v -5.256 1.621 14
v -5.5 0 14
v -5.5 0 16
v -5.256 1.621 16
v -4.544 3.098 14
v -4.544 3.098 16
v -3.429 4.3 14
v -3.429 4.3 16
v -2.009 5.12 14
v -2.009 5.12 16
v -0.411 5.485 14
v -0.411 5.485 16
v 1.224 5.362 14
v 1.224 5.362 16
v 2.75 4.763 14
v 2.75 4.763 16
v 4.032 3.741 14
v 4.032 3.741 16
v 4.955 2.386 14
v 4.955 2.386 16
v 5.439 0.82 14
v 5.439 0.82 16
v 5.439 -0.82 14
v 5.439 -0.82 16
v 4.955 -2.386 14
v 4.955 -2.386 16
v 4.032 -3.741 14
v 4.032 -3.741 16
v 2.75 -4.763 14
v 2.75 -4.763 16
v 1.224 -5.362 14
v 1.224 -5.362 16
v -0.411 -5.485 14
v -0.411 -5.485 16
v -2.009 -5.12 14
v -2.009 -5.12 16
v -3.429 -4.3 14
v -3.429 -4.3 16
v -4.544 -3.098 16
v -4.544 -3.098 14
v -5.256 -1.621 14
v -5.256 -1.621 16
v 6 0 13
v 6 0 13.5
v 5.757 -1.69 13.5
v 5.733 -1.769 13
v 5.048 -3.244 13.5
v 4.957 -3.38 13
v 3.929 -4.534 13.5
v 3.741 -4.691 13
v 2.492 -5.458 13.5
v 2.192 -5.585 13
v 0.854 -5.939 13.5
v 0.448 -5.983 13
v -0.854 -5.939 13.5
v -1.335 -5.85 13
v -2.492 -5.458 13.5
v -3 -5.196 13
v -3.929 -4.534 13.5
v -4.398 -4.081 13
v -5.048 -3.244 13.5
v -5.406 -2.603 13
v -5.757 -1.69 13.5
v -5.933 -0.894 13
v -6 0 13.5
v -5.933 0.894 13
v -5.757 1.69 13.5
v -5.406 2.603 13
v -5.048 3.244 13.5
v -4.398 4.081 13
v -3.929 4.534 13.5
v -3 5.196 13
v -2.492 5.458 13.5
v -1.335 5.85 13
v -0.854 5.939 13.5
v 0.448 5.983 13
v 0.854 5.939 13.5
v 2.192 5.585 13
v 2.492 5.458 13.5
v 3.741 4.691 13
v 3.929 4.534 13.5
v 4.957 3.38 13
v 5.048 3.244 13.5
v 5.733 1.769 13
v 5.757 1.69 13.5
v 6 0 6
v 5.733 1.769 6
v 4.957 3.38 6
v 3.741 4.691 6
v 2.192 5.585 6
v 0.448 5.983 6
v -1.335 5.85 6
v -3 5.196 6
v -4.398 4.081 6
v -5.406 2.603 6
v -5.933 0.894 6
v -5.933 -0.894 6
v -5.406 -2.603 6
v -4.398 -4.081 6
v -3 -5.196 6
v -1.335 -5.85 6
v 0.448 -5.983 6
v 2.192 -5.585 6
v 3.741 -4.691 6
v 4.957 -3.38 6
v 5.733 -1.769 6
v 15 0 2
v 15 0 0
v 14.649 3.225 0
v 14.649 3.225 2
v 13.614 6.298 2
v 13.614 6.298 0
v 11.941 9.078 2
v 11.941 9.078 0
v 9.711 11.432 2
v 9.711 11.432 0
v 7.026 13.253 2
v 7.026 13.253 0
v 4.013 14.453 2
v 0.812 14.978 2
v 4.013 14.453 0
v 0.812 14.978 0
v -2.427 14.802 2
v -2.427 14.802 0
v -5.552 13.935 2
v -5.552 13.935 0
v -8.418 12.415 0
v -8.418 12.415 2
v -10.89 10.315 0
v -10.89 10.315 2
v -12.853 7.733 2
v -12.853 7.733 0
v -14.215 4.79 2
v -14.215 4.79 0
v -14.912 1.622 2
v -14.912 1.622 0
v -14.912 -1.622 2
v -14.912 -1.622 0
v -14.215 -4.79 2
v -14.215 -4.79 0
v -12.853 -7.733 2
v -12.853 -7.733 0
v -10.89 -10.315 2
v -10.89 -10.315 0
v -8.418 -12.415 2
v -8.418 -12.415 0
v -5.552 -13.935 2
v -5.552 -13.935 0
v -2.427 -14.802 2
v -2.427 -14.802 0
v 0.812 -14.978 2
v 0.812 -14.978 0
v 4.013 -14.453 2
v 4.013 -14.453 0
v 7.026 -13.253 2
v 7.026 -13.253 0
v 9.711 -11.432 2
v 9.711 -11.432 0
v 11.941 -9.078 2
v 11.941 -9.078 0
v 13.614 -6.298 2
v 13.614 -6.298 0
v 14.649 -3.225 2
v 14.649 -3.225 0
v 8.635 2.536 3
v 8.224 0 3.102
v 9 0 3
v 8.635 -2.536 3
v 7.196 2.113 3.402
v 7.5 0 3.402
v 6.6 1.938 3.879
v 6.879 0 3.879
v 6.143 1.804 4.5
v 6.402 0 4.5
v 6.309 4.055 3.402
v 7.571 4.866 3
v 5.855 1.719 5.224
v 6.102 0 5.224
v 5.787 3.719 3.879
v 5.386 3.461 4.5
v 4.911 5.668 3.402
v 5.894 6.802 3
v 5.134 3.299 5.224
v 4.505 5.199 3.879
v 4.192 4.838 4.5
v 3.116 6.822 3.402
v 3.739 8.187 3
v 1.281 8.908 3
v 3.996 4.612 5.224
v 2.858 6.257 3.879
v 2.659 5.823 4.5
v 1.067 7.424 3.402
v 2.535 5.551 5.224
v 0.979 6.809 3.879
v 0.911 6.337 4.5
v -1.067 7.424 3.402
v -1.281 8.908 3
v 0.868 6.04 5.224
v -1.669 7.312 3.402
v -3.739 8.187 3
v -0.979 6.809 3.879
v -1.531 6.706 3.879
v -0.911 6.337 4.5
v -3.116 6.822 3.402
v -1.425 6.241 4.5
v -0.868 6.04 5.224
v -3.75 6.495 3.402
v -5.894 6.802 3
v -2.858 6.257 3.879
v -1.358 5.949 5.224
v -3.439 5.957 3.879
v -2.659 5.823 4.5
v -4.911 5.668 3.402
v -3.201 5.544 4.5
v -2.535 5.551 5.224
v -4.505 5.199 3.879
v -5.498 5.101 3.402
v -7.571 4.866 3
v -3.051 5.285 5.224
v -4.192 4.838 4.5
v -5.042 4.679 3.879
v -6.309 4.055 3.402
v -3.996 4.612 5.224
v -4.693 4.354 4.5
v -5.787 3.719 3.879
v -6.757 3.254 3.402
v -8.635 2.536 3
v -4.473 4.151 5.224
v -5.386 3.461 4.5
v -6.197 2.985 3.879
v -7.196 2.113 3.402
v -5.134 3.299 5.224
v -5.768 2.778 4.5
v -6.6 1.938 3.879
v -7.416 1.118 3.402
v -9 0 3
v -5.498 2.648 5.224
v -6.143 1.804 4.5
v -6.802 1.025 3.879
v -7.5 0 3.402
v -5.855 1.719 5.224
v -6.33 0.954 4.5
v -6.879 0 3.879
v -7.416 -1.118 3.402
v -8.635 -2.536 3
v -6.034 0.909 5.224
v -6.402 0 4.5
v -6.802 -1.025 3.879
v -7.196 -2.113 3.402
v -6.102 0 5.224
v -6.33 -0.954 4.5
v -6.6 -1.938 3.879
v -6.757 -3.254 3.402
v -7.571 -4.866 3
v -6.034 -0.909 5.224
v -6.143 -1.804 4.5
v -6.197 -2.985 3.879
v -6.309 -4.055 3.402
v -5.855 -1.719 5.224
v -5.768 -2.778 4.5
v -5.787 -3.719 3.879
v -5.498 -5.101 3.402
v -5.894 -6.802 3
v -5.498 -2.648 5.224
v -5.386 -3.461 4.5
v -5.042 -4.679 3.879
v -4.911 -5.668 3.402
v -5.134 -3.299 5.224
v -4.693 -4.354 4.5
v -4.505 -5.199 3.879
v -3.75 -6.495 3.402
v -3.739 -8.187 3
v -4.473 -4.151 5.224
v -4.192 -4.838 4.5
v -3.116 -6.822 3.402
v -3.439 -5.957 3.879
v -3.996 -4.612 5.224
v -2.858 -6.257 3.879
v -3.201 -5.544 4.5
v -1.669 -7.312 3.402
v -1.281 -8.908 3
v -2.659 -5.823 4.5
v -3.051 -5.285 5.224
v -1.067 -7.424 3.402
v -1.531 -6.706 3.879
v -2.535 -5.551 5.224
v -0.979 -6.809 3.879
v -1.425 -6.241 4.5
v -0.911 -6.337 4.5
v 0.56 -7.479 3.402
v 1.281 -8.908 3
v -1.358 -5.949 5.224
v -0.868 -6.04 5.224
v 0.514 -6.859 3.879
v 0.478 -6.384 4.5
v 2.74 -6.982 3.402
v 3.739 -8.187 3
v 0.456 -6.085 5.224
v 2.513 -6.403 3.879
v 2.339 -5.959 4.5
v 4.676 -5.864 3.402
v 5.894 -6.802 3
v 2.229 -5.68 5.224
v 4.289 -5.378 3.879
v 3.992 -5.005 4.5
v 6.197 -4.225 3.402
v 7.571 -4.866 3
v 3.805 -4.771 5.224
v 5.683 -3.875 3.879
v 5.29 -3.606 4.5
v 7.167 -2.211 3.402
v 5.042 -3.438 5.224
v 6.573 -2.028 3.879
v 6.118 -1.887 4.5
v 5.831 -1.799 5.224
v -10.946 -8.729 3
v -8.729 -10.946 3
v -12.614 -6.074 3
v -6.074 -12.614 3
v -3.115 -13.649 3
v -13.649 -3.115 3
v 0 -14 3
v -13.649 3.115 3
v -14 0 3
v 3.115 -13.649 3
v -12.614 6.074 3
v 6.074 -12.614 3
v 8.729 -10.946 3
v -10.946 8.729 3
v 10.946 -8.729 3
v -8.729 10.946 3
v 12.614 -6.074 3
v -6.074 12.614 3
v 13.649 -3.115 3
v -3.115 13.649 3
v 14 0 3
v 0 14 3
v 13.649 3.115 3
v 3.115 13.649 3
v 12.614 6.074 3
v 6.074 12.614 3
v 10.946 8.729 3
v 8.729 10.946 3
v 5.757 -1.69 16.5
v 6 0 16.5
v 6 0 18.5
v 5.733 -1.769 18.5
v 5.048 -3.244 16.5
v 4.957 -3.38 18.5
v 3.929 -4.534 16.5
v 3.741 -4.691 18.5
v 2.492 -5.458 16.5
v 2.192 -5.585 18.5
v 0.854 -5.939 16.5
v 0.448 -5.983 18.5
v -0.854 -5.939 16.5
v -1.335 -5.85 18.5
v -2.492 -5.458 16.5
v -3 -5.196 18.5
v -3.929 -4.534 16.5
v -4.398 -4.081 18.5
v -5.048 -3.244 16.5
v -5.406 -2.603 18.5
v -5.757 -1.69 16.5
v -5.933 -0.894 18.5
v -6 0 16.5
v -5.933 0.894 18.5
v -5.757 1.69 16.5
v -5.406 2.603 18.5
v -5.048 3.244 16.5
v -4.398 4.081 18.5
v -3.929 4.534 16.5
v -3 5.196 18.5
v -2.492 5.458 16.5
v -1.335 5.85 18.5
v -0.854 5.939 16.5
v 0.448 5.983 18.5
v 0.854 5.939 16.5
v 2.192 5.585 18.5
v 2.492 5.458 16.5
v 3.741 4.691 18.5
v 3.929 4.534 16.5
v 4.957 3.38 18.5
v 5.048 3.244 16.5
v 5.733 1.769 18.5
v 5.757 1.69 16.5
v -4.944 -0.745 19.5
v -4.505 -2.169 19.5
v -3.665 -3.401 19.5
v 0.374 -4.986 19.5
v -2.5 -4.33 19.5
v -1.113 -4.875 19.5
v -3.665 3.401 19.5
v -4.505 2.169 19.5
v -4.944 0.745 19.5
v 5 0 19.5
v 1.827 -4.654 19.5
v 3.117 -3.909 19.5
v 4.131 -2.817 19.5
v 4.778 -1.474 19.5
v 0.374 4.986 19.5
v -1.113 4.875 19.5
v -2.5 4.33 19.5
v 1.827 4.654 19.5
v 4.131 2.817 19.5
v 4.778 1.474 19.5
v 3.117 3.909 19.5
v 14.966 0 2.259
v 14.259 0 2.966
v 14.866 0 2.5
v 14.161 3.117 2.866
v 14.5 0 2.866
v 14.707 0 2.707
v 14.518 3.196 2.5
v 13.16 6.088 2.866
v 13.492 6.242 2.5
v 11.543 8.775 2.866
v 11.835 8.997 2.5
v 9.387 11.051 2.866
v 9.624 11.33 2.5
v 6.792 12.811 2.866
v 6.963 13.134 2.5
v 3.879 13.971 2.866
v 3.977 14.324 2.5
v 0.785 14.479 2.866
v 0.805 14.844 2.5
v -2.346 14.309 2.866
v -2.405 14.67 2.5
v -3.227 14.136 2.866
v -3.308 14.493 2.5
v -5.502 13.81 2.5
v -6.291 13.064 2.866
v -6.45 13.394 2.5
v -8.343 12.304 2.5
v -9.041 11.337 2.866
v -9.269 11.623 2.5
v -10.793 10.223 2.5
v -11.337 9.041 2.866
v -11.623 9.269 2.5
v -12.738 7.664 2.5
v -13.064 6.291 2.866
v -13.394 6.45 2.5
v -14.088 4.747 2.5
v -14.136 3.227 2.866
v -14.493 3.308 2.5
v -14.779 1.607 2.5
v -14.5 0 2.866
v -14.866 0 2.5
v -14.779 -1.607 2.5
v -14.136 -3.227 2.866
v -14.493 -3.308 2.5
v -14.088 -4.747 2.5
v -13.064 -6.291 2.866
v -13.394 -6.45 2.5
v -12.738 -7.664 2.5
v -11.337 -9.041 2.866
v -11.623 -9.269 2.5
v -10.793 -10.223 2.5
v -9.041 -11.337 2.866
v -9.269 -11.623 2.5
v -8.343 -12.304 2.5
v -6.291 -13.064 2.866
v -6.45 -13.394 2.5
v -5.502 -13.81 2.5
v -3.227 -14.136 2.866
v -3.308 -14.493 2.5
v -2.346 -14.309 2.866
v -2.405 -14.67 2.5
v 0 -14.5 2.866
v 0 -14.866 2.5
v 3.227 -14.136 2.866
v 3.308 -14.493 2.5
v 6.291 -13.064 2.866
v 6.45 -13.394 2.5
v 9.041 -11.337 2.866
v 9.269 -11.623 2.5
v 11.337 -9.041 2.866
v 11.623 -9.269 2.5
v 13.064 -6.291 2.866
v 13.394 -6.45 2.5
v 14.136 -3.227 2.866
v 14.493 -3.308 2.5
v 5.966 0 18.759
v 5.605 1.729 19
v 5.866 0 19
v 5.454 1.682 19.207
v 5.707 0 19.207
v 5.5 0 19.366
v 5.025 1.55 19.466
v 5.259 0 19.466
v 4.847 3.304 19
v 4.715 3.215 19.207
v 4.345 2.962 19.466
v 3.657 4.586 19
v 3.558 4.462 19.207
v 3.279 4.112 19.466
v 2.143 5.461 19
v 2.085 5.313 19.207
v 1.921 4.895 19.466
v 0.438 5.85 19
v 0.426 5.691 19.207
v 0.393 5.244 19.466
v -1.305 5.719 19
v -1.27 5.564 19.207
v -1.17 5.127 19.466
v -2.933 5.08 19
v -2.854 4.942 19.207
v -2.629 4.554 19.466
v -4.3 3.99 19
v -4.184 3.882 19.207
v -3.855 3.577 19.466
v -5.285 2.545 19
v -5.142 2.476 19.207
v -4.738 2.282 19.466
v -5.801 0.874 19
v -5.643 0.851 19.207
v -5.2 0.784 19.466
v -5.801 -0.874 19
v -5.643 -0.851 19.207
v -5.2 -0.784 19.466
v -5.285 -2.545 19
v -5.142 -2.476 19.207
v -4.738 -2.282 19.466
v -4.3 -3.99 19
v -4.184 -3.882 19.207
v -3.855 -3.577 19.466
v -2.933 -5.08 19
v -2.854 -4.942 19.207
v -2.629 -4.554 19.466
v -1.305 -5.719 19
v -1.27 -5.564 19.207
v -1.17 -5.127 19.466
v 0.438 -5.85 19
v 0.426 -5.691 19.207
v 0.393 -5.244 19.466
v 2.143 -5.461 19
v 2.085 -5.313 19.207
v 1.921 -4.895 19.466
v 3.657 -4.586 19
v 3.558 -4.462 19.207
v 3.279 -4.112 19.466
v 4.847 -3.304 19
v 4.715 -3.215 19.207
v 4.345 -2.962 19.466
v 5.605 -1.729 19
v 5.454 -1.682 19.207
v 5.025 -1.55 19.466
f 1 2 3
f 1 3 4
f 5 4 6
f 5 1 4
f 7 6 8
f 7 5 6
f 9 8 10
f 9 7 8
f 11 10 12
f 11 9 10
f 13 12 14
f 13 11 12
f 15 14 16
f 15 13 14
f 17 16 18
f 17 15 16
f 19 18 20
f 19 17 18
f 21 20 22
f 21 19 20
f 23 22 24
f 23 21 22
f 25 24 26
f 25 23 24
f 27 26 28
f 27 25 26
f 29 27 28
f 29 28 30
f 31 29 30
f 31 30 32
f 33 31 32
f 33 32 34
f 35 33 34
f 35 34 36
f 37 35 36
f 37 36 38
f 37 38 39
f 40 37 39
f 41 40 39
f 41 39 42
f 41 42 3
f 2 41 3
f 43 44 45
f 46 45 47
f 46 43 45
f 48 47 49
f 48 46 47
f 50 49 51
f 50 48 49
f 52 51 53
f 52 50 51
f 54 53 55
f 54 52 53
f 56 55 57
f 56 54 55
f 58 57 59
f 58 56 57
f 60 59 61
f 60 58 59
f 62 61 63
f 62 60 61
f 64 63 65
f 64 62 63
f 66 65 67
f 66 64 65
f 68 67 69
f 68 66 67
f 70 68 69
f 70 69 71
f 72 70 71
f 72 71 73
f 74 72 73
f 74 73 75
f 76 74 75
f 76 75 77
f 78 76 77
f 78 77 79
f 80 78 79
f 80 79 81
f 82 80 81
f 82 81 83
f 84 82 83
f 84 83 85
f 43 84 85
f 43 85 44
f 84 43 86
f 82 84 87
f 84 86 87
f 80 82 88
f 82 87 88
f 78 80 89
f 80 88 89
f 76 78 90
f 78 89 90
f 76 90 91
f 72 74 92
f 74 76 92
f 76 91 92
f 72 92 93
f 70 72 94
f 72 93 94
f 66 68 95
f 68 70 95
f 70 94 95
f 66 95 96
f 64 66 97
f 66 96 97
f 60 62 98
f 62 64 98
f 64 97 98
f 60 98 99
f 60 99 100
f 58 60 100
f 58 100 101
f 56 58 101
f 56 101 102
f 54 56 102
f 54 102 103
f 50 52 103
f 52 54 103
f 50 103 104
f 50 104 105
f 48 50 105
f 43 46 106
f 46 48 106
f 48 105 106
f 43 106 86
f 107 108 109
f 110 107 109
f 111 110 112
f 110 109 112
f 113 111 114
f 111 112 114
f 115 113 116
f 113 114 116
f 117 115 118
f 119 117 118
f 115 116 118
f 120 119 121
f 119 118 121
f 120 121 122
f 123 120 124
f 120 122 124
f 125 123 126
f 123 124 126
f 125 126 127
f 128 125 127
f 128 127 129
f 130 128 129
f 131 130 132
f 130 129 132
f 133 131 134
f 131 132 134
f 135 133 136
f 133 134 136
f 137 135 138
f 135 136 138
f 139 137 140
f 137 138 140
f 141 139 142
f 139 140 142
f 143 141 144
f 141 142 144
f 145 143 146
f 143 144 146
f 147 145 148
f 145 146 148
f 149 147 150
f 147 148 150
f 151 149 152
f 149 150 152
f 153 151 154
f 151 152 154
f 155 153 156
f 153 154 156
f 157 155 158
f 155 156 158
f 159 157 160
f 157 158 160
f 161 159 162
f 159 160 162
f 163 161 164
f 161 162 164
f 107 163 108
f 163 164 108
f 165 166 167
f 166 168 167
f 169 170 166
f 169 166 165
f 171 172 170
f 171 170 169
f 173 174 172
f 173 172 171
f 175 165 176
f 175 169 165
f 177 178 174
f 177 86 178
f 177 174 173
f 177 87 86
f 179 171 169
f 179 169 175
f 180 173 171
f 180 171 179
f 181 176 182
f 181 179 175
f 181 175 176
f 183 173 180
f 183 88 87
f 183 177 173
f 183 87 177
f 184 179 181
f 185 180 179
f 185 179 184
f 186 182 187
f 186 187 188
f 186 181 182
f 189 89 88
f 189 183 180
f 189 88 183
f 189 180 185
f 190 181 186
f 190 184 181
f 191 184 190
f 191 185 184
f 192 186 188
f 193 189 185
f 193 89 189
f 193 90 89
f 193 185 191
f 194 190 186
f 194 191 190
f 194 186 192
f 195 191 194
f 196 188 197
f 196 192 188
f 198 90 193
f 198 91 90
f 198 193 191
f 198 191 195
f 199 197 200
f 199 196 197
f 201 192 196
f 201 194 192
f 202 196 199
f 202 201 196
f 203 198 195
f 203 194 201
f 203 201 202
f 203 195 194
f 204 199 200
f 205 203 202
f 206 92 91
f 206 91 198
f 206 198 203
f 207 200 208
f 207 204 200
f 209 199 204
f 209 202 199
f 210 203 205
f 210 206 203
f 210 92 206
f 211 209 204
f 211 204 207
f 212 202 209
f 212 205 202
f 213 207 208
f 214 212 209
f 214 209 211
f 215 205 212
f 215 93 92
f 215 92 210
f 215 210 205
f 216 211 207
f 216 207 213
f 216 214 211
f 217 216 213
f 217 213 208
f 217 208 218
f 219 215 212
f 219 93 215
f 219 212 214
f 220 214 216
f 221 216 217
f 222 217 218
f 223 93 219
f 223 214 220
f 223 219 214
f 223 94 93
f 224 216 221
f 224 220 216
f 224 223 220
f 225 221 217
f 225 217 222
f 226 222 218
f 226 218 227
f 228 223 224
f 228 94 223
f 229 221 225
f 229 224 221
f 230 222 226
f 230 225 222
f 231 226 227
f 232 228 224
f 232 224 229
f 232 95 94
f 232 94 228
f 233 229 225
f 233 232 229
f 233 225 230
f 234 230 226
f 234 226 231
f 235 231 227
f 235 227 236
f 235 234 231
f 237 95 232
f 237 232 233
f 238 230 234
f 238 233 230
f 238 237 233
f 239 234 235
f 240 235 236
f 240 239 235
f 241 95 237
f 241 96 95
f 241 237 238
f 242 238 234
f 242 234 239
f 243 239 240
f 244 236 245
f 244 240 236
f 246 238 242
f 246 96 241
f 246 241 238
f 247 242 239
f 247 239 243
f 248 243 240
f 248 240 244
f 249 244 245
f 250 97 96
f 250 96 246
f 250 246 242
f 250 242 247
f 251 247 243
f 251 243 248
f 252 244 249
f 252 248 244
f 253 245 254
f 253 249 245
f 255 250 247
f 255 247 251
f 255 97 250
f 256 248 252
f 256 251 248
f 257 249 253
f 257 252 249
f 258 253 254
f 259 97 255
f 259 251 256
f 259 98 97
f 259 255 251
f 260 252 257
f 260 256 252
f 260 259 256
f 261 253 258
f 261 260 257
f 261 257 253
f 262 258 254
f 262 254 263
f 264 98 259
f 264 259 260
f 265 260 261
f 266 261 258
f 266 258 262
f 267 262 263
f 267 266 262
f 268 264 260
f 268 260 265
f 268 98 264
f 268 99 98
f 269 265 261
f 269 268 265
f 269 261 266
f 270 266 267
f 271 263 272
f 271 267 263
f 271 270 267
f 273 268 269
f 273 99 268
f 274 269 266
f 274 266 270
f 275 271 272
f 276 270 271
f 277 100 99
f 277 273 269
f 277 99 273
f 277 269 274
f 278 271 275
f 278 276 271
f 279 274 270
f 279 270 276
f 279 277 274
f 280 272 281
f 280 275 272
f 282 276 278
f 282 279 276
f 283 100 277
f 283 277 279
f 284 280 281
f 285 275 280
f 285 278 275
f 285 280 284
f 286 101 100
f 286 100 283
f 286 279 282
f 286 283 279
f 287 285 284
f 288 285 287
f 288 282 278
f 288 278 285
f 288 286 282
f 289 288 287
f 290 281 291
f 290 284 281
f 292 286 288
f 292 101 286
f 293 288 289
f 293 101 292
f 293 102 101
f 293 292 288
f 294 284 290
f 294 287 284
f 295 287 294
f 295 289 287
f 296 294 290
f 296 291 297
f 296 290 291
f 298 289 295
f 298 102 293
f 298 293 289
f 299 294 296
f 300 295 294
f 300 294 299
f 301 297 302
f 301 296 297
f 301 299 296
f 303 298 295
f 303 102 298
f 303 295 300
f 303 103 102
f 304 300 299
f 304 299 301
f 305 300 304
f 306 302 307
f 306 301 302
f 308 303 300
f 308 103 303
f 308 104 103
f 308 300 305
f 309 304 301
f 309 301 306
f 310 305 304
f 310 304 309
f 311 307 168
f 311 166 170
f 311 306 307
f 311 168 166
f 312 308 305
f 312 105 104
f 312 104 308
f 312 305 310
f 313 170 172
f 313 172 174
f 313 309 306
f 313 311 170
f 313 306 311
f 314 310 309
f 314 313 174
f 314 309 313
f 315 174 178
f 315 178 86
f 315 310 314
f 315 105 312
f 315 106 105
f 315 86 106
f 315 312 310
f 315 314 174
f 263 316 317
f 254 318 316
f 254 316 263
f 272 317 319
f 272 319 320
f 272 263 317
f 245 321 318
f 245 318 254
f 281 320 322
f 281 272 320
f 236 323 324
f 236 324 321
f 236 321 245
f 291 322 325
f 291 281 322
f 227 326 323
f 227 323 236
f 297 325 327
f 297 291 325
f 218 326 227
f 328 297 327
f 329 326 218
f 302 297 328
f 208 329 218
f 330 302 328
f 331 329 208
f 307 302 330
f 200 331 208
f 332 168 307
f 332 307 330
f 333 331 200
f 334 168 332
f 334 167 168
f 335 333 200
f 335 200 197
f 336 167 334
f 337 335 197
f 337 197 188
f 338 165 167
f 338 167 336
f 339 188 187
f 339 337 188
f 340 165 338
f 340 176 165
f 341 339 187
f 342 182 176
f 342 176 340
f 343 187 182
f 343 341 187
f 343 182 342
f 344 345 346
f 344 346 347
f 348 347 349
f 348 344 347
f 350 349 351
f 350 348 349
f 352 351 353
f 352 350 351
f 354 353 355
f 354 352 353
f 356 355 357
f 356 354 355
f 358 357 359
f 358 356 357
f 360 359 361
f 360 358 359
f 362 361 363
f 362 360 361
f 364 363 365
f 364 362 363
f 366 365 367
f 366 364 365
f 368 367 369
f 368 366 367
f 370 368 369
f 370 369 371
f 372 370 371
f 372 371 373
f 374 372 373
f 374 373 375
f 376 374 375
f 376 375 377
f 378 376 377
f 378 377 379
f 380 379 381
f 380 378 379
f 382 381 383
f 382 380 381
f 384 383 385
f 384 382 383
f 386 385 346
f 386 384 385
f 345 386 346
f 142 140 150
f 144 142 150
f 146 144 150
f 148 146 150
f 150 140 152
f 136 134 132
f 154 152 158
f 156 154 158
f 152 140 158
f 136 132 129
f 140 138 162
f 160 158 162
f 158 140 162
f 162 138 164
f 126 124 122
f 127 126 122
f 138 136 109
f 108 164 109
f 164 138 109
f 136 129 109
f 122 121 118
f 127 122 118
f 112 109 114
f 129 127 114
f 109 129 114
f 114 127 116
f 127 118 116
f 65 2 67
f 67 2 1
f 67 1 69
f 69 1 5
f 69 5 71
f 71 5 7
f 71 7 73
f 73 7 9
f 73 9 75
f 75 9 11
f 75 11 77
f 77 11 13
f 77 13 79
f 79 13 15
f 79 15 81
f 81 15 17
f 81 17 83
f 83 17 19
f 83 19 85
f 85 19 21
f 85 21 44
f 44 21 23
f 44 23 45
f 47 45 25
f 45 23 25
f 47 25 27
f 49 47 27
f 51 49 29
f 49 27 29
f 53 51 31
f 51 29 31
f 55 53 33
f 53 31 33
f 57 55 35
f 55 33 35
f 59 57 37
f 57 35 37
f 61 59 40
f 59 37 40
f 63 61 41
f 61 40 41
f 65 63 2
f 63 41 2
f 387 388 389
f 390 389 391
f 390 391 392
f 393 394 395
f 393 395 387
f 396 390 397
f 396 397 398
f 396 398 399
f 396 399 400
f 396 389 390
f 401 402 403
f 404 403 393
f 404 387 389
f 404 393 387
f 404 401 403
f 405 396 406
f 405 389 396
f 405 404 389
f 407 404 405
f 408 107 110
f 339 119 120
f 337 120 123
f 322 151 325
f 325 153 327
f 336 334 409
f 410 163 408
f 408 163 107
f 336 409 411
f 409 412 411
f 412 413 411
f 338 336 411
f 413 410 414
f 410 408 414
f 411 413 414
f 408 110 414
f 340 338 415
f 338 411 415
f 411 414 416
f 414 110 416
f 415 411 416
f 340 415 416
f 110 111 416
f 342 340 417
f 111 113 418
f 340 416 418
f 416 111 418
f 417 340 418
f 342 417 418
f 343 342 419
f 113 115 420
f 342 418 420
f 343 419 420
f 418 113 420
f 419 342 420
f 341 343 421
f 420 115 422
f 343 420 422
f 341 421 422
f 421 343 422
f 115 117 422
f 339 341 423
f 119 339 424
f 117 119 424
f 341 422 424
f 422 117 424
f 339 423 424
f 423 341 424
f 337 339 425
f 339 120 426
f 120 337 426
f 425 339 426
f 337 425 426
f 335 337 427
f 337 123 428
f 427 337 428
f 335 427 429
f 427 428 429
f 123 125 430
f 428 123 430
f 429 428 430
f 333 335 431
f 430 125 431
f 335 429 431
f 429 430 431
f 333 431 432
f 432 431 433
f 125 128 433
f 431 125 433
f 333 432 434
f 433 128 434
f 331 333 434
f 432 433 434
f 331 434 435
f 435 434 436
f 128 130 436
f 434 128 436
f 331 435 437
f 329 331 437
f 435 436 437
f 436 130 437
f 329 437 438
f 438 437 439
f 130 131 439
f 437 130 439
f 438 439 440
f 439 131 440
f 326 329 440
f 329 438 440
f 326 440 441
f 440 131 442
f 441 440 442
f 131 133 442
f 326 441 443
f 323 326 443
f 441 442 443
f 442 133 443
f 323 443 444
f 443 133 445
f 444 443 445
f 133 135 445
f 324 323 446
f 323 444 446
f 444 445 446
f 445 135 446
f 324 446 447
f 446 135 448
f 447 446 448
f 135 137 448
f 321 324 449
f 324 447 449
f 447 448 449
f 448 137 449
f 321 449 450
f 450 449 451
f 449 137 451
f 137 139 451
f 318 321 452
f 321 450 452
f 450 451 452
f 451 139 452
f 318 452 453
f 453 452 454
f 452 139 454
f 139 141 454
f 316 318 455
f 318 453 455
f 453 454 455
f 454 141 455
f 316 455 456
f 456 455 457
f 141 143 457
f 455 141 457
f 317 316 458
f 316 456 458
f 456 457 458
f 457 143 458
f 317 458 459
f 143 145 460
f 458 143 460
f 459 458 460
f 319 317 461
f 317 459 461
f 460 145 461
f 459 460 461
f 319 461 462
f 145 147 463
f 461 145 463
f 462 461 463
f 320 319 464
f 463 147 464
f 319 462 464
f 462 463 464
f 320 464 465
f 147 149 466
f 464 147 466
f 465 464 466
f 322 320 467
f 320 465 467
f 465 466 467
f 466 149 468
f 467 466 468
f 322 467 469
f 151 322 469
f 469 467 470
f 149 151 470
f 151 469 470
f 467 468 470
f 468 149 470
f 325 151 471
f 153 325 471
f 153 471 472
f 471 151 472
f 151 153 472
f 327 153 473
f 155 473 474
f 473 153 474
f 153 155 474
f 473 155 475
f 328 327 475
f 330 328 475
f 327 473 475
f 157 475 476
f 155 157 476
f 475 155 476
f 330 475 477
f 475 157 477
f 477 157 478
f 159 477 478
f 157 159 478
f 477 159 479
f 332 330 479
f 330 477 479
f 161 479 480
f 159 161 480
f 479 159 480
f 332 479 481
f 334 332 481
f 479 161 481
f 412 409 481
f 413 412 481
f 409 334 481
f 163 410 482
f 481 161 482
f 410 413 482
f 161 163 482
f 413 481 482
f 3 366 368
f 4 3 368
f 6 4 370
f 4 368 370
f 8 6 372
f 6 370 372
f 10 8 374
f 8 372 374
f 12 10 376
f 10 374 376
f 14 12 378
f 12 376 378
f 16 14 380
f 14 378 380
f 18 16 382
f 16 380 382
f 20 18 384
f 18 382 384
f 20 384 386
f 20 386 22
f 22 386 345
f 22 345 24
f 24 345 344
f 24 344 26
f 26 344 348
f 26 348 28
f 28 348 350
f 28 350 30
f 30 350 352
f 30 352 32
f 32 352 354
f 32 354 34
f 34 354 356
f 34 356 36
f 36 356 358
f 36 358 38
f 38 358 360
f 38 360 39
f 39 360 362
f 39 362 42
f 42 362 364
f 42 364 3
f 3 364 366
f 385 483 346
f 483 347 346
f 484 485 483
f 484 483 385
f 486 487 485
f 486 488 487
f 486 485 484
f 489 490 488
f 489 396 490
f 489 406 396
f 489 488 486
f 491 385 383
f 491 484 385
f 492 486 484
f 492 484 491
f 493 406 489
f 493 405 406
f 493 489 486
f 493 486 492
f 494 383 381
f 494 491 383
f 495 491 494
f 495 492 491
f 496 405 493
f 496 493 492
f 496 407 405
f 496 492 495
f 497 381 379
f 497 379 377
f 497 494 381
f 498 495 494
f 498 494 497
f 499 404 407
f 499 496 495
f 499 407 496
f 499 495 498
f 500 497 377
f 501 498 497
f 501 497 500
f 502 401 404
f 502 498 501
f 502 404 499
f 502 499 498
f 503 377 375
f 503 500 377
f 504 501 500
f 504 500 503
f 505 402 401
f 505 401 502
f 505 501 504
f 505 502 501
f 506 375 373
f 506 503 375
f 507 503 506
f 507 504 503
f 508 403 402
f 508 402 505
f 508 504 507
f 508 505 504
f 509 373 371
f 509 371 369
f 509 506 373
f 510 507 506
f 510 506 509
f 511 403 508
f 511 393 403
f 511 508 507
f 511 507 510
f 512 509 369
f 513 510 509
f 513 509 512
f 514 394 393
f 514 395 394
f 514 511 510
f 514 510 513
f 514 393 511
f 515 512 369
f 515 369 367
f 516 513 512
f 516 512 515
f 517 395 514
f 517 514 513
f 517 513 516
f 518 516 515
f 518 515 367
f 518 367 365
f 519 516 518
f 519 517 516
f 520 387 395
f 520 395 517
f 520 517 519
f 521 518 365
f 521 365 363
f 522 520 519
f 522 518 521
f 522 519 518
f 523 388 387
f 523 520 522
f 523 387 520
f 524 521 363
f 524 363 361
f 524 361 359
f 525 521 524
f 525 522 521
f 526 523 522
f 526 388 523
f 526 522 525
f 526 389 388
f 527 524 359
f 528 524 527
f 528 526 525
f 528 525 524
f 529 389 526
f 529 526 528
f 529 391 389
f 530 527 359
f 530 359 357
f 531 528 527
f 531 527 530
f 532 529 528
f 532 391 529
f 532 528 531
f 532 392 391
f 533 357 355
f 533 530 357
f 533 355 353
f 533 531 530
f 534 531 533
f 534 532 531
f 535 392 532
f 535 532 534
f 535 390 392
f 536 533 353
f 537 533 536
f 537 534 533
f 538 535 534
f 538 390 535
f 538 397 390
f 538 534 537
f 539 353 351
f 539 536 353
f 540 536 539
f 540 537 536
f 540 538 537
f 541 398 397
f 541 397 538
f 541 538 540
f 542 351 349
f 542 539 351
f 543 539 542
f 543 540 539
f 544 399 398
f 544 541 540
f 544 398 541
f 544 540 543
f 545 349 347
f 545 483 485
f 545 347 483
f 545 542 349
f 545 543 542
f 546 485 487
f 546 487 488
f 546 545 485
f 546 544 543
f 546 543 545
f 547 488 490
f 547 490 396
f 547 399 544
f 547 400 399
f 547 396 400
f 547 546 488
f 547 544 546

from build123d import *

# Parameters (mm, degrees)
SKETCH_1_R          = 15
EXTRUDE_1_DEPTH     = 3
SKETCH_2_R          = 6
EXTRUDE_2_DEPTH     = 16.5
FILLET_1_R          = 3
FILLET_2_R          = 1
FILLET_3_R          = 1
SKETCH_3_R          = 6
SKETCH_3_R_2        = 5.5
CUT_EXTRUDE_1_DEPTH = 4
CHAMFER_1_SIZE      = 1


with BuildPart() as part:
    # 草图1 → 凸台-拉伸1 (new body)
    with BuildSketch(Plane.XY):
        Circle(SKETCH_1_R)
    extrude(amount=EXTRUDE_1_DEPTH)

    # 草图2 → 凸台-拉伸2 (add)
    with BuildSketch(Plane.XY.offset(3)):
        Circle(SKETCH_2_R)
    extrude(amount=EXTRUDE_2_DEPTH)

    # 圆角1
    fillet_1_edges = [part.edges().sort_by_distance(p)[0] for p in [
        (-6, 0, 3),
    ]]
    fillet(fillet_1_edges, radius=FILLET_1_R)

    # 圆角2
    fillet_2_edges = [part.edges().sort_by_distance(p)[0] for p in [
        (-15, 0, 3),
    ]]
    fillet(fillet_2_edges, radius=FILLET_2_R)

    # 圆角3
    fillet_3_edges = [part.edges().sort_by_distance(p)[0] for p in [
        (-6, 0, 19.5),
    ]]
    fillet(fillet_3_edges, radius=FILLET_3_R)

    # 草图3 → 切除-拉伸1 (cut)
    with BuildSketch(Plane(origin=(0, 0, 13), x_dir=(-1, 0, 0), z_dir=(0, 0, -1))):
        Circle(SKETCH_3_R)
        Circle(SKETCH_3_R_2, mode=Mode.SUBTRACT)
    extrude(amount=-CUT_EXTRUDE_1_DEPTH, mode=Mode.SUBTRACT)

    # 倒角1
    # the kernel refuses this chamfer: 1 mm, written as the material it adds along each edge
    with BuildSketch(Plane(origin=(0, 0, 13), x_dir=(-1, 0, 0), z_dir=(0, -1, 0))) as chamfer_1_piece_1_section:
        Polygon((5.5 + CHAMFER_1_SIZE, 0), (5.5, -CHAMFER_1_SIZE), (5.5, 0), align=None)
    chamfer_1_piece_1 = revolve(axis=Axis((0, 0, 13), (0, 0, -1)), mode=Mode.PRIVATE)
    chamfer_1_piece_1 = chamfer_1_piece_1 & Plane(origin=(0, 0, 13.746832488), x_dir=(1, 0, 0), z_dir=(0, 0, -1)) * Cylinder(6, 26, mode=Mode.PRIVATE)
    add(chamfer_1_piece_1)
    with BuildSketch(Plane(origin=(0, 0, 17), x_dir=(-1, 0, 0), z_dir=(0, -1, 0))) as chamfer_1_piece_2_section:
        Polygon((5.5, CHAMFER_1_SIZE), (5.5 + CHAMFER_1_SIZE, 0), (5.5, 0), align=None)
    chamfer_1_piece_2 = revolve(axis=Axis((0, 0, 17), (0, 0, -1)), mode=Mode.PRIVATE)
    chamfer_1_piece_2 = chamfer_1_piece_2 & Plane(origin=(0, 0, 16.253167512), x_dir=(1, 0, 0), z_dir=(0, 0, -1)) * Cylinder(6, 26, mode=Mode.PRIVATE)
    add(chamfer_1_piece_2)


solid = part.part
